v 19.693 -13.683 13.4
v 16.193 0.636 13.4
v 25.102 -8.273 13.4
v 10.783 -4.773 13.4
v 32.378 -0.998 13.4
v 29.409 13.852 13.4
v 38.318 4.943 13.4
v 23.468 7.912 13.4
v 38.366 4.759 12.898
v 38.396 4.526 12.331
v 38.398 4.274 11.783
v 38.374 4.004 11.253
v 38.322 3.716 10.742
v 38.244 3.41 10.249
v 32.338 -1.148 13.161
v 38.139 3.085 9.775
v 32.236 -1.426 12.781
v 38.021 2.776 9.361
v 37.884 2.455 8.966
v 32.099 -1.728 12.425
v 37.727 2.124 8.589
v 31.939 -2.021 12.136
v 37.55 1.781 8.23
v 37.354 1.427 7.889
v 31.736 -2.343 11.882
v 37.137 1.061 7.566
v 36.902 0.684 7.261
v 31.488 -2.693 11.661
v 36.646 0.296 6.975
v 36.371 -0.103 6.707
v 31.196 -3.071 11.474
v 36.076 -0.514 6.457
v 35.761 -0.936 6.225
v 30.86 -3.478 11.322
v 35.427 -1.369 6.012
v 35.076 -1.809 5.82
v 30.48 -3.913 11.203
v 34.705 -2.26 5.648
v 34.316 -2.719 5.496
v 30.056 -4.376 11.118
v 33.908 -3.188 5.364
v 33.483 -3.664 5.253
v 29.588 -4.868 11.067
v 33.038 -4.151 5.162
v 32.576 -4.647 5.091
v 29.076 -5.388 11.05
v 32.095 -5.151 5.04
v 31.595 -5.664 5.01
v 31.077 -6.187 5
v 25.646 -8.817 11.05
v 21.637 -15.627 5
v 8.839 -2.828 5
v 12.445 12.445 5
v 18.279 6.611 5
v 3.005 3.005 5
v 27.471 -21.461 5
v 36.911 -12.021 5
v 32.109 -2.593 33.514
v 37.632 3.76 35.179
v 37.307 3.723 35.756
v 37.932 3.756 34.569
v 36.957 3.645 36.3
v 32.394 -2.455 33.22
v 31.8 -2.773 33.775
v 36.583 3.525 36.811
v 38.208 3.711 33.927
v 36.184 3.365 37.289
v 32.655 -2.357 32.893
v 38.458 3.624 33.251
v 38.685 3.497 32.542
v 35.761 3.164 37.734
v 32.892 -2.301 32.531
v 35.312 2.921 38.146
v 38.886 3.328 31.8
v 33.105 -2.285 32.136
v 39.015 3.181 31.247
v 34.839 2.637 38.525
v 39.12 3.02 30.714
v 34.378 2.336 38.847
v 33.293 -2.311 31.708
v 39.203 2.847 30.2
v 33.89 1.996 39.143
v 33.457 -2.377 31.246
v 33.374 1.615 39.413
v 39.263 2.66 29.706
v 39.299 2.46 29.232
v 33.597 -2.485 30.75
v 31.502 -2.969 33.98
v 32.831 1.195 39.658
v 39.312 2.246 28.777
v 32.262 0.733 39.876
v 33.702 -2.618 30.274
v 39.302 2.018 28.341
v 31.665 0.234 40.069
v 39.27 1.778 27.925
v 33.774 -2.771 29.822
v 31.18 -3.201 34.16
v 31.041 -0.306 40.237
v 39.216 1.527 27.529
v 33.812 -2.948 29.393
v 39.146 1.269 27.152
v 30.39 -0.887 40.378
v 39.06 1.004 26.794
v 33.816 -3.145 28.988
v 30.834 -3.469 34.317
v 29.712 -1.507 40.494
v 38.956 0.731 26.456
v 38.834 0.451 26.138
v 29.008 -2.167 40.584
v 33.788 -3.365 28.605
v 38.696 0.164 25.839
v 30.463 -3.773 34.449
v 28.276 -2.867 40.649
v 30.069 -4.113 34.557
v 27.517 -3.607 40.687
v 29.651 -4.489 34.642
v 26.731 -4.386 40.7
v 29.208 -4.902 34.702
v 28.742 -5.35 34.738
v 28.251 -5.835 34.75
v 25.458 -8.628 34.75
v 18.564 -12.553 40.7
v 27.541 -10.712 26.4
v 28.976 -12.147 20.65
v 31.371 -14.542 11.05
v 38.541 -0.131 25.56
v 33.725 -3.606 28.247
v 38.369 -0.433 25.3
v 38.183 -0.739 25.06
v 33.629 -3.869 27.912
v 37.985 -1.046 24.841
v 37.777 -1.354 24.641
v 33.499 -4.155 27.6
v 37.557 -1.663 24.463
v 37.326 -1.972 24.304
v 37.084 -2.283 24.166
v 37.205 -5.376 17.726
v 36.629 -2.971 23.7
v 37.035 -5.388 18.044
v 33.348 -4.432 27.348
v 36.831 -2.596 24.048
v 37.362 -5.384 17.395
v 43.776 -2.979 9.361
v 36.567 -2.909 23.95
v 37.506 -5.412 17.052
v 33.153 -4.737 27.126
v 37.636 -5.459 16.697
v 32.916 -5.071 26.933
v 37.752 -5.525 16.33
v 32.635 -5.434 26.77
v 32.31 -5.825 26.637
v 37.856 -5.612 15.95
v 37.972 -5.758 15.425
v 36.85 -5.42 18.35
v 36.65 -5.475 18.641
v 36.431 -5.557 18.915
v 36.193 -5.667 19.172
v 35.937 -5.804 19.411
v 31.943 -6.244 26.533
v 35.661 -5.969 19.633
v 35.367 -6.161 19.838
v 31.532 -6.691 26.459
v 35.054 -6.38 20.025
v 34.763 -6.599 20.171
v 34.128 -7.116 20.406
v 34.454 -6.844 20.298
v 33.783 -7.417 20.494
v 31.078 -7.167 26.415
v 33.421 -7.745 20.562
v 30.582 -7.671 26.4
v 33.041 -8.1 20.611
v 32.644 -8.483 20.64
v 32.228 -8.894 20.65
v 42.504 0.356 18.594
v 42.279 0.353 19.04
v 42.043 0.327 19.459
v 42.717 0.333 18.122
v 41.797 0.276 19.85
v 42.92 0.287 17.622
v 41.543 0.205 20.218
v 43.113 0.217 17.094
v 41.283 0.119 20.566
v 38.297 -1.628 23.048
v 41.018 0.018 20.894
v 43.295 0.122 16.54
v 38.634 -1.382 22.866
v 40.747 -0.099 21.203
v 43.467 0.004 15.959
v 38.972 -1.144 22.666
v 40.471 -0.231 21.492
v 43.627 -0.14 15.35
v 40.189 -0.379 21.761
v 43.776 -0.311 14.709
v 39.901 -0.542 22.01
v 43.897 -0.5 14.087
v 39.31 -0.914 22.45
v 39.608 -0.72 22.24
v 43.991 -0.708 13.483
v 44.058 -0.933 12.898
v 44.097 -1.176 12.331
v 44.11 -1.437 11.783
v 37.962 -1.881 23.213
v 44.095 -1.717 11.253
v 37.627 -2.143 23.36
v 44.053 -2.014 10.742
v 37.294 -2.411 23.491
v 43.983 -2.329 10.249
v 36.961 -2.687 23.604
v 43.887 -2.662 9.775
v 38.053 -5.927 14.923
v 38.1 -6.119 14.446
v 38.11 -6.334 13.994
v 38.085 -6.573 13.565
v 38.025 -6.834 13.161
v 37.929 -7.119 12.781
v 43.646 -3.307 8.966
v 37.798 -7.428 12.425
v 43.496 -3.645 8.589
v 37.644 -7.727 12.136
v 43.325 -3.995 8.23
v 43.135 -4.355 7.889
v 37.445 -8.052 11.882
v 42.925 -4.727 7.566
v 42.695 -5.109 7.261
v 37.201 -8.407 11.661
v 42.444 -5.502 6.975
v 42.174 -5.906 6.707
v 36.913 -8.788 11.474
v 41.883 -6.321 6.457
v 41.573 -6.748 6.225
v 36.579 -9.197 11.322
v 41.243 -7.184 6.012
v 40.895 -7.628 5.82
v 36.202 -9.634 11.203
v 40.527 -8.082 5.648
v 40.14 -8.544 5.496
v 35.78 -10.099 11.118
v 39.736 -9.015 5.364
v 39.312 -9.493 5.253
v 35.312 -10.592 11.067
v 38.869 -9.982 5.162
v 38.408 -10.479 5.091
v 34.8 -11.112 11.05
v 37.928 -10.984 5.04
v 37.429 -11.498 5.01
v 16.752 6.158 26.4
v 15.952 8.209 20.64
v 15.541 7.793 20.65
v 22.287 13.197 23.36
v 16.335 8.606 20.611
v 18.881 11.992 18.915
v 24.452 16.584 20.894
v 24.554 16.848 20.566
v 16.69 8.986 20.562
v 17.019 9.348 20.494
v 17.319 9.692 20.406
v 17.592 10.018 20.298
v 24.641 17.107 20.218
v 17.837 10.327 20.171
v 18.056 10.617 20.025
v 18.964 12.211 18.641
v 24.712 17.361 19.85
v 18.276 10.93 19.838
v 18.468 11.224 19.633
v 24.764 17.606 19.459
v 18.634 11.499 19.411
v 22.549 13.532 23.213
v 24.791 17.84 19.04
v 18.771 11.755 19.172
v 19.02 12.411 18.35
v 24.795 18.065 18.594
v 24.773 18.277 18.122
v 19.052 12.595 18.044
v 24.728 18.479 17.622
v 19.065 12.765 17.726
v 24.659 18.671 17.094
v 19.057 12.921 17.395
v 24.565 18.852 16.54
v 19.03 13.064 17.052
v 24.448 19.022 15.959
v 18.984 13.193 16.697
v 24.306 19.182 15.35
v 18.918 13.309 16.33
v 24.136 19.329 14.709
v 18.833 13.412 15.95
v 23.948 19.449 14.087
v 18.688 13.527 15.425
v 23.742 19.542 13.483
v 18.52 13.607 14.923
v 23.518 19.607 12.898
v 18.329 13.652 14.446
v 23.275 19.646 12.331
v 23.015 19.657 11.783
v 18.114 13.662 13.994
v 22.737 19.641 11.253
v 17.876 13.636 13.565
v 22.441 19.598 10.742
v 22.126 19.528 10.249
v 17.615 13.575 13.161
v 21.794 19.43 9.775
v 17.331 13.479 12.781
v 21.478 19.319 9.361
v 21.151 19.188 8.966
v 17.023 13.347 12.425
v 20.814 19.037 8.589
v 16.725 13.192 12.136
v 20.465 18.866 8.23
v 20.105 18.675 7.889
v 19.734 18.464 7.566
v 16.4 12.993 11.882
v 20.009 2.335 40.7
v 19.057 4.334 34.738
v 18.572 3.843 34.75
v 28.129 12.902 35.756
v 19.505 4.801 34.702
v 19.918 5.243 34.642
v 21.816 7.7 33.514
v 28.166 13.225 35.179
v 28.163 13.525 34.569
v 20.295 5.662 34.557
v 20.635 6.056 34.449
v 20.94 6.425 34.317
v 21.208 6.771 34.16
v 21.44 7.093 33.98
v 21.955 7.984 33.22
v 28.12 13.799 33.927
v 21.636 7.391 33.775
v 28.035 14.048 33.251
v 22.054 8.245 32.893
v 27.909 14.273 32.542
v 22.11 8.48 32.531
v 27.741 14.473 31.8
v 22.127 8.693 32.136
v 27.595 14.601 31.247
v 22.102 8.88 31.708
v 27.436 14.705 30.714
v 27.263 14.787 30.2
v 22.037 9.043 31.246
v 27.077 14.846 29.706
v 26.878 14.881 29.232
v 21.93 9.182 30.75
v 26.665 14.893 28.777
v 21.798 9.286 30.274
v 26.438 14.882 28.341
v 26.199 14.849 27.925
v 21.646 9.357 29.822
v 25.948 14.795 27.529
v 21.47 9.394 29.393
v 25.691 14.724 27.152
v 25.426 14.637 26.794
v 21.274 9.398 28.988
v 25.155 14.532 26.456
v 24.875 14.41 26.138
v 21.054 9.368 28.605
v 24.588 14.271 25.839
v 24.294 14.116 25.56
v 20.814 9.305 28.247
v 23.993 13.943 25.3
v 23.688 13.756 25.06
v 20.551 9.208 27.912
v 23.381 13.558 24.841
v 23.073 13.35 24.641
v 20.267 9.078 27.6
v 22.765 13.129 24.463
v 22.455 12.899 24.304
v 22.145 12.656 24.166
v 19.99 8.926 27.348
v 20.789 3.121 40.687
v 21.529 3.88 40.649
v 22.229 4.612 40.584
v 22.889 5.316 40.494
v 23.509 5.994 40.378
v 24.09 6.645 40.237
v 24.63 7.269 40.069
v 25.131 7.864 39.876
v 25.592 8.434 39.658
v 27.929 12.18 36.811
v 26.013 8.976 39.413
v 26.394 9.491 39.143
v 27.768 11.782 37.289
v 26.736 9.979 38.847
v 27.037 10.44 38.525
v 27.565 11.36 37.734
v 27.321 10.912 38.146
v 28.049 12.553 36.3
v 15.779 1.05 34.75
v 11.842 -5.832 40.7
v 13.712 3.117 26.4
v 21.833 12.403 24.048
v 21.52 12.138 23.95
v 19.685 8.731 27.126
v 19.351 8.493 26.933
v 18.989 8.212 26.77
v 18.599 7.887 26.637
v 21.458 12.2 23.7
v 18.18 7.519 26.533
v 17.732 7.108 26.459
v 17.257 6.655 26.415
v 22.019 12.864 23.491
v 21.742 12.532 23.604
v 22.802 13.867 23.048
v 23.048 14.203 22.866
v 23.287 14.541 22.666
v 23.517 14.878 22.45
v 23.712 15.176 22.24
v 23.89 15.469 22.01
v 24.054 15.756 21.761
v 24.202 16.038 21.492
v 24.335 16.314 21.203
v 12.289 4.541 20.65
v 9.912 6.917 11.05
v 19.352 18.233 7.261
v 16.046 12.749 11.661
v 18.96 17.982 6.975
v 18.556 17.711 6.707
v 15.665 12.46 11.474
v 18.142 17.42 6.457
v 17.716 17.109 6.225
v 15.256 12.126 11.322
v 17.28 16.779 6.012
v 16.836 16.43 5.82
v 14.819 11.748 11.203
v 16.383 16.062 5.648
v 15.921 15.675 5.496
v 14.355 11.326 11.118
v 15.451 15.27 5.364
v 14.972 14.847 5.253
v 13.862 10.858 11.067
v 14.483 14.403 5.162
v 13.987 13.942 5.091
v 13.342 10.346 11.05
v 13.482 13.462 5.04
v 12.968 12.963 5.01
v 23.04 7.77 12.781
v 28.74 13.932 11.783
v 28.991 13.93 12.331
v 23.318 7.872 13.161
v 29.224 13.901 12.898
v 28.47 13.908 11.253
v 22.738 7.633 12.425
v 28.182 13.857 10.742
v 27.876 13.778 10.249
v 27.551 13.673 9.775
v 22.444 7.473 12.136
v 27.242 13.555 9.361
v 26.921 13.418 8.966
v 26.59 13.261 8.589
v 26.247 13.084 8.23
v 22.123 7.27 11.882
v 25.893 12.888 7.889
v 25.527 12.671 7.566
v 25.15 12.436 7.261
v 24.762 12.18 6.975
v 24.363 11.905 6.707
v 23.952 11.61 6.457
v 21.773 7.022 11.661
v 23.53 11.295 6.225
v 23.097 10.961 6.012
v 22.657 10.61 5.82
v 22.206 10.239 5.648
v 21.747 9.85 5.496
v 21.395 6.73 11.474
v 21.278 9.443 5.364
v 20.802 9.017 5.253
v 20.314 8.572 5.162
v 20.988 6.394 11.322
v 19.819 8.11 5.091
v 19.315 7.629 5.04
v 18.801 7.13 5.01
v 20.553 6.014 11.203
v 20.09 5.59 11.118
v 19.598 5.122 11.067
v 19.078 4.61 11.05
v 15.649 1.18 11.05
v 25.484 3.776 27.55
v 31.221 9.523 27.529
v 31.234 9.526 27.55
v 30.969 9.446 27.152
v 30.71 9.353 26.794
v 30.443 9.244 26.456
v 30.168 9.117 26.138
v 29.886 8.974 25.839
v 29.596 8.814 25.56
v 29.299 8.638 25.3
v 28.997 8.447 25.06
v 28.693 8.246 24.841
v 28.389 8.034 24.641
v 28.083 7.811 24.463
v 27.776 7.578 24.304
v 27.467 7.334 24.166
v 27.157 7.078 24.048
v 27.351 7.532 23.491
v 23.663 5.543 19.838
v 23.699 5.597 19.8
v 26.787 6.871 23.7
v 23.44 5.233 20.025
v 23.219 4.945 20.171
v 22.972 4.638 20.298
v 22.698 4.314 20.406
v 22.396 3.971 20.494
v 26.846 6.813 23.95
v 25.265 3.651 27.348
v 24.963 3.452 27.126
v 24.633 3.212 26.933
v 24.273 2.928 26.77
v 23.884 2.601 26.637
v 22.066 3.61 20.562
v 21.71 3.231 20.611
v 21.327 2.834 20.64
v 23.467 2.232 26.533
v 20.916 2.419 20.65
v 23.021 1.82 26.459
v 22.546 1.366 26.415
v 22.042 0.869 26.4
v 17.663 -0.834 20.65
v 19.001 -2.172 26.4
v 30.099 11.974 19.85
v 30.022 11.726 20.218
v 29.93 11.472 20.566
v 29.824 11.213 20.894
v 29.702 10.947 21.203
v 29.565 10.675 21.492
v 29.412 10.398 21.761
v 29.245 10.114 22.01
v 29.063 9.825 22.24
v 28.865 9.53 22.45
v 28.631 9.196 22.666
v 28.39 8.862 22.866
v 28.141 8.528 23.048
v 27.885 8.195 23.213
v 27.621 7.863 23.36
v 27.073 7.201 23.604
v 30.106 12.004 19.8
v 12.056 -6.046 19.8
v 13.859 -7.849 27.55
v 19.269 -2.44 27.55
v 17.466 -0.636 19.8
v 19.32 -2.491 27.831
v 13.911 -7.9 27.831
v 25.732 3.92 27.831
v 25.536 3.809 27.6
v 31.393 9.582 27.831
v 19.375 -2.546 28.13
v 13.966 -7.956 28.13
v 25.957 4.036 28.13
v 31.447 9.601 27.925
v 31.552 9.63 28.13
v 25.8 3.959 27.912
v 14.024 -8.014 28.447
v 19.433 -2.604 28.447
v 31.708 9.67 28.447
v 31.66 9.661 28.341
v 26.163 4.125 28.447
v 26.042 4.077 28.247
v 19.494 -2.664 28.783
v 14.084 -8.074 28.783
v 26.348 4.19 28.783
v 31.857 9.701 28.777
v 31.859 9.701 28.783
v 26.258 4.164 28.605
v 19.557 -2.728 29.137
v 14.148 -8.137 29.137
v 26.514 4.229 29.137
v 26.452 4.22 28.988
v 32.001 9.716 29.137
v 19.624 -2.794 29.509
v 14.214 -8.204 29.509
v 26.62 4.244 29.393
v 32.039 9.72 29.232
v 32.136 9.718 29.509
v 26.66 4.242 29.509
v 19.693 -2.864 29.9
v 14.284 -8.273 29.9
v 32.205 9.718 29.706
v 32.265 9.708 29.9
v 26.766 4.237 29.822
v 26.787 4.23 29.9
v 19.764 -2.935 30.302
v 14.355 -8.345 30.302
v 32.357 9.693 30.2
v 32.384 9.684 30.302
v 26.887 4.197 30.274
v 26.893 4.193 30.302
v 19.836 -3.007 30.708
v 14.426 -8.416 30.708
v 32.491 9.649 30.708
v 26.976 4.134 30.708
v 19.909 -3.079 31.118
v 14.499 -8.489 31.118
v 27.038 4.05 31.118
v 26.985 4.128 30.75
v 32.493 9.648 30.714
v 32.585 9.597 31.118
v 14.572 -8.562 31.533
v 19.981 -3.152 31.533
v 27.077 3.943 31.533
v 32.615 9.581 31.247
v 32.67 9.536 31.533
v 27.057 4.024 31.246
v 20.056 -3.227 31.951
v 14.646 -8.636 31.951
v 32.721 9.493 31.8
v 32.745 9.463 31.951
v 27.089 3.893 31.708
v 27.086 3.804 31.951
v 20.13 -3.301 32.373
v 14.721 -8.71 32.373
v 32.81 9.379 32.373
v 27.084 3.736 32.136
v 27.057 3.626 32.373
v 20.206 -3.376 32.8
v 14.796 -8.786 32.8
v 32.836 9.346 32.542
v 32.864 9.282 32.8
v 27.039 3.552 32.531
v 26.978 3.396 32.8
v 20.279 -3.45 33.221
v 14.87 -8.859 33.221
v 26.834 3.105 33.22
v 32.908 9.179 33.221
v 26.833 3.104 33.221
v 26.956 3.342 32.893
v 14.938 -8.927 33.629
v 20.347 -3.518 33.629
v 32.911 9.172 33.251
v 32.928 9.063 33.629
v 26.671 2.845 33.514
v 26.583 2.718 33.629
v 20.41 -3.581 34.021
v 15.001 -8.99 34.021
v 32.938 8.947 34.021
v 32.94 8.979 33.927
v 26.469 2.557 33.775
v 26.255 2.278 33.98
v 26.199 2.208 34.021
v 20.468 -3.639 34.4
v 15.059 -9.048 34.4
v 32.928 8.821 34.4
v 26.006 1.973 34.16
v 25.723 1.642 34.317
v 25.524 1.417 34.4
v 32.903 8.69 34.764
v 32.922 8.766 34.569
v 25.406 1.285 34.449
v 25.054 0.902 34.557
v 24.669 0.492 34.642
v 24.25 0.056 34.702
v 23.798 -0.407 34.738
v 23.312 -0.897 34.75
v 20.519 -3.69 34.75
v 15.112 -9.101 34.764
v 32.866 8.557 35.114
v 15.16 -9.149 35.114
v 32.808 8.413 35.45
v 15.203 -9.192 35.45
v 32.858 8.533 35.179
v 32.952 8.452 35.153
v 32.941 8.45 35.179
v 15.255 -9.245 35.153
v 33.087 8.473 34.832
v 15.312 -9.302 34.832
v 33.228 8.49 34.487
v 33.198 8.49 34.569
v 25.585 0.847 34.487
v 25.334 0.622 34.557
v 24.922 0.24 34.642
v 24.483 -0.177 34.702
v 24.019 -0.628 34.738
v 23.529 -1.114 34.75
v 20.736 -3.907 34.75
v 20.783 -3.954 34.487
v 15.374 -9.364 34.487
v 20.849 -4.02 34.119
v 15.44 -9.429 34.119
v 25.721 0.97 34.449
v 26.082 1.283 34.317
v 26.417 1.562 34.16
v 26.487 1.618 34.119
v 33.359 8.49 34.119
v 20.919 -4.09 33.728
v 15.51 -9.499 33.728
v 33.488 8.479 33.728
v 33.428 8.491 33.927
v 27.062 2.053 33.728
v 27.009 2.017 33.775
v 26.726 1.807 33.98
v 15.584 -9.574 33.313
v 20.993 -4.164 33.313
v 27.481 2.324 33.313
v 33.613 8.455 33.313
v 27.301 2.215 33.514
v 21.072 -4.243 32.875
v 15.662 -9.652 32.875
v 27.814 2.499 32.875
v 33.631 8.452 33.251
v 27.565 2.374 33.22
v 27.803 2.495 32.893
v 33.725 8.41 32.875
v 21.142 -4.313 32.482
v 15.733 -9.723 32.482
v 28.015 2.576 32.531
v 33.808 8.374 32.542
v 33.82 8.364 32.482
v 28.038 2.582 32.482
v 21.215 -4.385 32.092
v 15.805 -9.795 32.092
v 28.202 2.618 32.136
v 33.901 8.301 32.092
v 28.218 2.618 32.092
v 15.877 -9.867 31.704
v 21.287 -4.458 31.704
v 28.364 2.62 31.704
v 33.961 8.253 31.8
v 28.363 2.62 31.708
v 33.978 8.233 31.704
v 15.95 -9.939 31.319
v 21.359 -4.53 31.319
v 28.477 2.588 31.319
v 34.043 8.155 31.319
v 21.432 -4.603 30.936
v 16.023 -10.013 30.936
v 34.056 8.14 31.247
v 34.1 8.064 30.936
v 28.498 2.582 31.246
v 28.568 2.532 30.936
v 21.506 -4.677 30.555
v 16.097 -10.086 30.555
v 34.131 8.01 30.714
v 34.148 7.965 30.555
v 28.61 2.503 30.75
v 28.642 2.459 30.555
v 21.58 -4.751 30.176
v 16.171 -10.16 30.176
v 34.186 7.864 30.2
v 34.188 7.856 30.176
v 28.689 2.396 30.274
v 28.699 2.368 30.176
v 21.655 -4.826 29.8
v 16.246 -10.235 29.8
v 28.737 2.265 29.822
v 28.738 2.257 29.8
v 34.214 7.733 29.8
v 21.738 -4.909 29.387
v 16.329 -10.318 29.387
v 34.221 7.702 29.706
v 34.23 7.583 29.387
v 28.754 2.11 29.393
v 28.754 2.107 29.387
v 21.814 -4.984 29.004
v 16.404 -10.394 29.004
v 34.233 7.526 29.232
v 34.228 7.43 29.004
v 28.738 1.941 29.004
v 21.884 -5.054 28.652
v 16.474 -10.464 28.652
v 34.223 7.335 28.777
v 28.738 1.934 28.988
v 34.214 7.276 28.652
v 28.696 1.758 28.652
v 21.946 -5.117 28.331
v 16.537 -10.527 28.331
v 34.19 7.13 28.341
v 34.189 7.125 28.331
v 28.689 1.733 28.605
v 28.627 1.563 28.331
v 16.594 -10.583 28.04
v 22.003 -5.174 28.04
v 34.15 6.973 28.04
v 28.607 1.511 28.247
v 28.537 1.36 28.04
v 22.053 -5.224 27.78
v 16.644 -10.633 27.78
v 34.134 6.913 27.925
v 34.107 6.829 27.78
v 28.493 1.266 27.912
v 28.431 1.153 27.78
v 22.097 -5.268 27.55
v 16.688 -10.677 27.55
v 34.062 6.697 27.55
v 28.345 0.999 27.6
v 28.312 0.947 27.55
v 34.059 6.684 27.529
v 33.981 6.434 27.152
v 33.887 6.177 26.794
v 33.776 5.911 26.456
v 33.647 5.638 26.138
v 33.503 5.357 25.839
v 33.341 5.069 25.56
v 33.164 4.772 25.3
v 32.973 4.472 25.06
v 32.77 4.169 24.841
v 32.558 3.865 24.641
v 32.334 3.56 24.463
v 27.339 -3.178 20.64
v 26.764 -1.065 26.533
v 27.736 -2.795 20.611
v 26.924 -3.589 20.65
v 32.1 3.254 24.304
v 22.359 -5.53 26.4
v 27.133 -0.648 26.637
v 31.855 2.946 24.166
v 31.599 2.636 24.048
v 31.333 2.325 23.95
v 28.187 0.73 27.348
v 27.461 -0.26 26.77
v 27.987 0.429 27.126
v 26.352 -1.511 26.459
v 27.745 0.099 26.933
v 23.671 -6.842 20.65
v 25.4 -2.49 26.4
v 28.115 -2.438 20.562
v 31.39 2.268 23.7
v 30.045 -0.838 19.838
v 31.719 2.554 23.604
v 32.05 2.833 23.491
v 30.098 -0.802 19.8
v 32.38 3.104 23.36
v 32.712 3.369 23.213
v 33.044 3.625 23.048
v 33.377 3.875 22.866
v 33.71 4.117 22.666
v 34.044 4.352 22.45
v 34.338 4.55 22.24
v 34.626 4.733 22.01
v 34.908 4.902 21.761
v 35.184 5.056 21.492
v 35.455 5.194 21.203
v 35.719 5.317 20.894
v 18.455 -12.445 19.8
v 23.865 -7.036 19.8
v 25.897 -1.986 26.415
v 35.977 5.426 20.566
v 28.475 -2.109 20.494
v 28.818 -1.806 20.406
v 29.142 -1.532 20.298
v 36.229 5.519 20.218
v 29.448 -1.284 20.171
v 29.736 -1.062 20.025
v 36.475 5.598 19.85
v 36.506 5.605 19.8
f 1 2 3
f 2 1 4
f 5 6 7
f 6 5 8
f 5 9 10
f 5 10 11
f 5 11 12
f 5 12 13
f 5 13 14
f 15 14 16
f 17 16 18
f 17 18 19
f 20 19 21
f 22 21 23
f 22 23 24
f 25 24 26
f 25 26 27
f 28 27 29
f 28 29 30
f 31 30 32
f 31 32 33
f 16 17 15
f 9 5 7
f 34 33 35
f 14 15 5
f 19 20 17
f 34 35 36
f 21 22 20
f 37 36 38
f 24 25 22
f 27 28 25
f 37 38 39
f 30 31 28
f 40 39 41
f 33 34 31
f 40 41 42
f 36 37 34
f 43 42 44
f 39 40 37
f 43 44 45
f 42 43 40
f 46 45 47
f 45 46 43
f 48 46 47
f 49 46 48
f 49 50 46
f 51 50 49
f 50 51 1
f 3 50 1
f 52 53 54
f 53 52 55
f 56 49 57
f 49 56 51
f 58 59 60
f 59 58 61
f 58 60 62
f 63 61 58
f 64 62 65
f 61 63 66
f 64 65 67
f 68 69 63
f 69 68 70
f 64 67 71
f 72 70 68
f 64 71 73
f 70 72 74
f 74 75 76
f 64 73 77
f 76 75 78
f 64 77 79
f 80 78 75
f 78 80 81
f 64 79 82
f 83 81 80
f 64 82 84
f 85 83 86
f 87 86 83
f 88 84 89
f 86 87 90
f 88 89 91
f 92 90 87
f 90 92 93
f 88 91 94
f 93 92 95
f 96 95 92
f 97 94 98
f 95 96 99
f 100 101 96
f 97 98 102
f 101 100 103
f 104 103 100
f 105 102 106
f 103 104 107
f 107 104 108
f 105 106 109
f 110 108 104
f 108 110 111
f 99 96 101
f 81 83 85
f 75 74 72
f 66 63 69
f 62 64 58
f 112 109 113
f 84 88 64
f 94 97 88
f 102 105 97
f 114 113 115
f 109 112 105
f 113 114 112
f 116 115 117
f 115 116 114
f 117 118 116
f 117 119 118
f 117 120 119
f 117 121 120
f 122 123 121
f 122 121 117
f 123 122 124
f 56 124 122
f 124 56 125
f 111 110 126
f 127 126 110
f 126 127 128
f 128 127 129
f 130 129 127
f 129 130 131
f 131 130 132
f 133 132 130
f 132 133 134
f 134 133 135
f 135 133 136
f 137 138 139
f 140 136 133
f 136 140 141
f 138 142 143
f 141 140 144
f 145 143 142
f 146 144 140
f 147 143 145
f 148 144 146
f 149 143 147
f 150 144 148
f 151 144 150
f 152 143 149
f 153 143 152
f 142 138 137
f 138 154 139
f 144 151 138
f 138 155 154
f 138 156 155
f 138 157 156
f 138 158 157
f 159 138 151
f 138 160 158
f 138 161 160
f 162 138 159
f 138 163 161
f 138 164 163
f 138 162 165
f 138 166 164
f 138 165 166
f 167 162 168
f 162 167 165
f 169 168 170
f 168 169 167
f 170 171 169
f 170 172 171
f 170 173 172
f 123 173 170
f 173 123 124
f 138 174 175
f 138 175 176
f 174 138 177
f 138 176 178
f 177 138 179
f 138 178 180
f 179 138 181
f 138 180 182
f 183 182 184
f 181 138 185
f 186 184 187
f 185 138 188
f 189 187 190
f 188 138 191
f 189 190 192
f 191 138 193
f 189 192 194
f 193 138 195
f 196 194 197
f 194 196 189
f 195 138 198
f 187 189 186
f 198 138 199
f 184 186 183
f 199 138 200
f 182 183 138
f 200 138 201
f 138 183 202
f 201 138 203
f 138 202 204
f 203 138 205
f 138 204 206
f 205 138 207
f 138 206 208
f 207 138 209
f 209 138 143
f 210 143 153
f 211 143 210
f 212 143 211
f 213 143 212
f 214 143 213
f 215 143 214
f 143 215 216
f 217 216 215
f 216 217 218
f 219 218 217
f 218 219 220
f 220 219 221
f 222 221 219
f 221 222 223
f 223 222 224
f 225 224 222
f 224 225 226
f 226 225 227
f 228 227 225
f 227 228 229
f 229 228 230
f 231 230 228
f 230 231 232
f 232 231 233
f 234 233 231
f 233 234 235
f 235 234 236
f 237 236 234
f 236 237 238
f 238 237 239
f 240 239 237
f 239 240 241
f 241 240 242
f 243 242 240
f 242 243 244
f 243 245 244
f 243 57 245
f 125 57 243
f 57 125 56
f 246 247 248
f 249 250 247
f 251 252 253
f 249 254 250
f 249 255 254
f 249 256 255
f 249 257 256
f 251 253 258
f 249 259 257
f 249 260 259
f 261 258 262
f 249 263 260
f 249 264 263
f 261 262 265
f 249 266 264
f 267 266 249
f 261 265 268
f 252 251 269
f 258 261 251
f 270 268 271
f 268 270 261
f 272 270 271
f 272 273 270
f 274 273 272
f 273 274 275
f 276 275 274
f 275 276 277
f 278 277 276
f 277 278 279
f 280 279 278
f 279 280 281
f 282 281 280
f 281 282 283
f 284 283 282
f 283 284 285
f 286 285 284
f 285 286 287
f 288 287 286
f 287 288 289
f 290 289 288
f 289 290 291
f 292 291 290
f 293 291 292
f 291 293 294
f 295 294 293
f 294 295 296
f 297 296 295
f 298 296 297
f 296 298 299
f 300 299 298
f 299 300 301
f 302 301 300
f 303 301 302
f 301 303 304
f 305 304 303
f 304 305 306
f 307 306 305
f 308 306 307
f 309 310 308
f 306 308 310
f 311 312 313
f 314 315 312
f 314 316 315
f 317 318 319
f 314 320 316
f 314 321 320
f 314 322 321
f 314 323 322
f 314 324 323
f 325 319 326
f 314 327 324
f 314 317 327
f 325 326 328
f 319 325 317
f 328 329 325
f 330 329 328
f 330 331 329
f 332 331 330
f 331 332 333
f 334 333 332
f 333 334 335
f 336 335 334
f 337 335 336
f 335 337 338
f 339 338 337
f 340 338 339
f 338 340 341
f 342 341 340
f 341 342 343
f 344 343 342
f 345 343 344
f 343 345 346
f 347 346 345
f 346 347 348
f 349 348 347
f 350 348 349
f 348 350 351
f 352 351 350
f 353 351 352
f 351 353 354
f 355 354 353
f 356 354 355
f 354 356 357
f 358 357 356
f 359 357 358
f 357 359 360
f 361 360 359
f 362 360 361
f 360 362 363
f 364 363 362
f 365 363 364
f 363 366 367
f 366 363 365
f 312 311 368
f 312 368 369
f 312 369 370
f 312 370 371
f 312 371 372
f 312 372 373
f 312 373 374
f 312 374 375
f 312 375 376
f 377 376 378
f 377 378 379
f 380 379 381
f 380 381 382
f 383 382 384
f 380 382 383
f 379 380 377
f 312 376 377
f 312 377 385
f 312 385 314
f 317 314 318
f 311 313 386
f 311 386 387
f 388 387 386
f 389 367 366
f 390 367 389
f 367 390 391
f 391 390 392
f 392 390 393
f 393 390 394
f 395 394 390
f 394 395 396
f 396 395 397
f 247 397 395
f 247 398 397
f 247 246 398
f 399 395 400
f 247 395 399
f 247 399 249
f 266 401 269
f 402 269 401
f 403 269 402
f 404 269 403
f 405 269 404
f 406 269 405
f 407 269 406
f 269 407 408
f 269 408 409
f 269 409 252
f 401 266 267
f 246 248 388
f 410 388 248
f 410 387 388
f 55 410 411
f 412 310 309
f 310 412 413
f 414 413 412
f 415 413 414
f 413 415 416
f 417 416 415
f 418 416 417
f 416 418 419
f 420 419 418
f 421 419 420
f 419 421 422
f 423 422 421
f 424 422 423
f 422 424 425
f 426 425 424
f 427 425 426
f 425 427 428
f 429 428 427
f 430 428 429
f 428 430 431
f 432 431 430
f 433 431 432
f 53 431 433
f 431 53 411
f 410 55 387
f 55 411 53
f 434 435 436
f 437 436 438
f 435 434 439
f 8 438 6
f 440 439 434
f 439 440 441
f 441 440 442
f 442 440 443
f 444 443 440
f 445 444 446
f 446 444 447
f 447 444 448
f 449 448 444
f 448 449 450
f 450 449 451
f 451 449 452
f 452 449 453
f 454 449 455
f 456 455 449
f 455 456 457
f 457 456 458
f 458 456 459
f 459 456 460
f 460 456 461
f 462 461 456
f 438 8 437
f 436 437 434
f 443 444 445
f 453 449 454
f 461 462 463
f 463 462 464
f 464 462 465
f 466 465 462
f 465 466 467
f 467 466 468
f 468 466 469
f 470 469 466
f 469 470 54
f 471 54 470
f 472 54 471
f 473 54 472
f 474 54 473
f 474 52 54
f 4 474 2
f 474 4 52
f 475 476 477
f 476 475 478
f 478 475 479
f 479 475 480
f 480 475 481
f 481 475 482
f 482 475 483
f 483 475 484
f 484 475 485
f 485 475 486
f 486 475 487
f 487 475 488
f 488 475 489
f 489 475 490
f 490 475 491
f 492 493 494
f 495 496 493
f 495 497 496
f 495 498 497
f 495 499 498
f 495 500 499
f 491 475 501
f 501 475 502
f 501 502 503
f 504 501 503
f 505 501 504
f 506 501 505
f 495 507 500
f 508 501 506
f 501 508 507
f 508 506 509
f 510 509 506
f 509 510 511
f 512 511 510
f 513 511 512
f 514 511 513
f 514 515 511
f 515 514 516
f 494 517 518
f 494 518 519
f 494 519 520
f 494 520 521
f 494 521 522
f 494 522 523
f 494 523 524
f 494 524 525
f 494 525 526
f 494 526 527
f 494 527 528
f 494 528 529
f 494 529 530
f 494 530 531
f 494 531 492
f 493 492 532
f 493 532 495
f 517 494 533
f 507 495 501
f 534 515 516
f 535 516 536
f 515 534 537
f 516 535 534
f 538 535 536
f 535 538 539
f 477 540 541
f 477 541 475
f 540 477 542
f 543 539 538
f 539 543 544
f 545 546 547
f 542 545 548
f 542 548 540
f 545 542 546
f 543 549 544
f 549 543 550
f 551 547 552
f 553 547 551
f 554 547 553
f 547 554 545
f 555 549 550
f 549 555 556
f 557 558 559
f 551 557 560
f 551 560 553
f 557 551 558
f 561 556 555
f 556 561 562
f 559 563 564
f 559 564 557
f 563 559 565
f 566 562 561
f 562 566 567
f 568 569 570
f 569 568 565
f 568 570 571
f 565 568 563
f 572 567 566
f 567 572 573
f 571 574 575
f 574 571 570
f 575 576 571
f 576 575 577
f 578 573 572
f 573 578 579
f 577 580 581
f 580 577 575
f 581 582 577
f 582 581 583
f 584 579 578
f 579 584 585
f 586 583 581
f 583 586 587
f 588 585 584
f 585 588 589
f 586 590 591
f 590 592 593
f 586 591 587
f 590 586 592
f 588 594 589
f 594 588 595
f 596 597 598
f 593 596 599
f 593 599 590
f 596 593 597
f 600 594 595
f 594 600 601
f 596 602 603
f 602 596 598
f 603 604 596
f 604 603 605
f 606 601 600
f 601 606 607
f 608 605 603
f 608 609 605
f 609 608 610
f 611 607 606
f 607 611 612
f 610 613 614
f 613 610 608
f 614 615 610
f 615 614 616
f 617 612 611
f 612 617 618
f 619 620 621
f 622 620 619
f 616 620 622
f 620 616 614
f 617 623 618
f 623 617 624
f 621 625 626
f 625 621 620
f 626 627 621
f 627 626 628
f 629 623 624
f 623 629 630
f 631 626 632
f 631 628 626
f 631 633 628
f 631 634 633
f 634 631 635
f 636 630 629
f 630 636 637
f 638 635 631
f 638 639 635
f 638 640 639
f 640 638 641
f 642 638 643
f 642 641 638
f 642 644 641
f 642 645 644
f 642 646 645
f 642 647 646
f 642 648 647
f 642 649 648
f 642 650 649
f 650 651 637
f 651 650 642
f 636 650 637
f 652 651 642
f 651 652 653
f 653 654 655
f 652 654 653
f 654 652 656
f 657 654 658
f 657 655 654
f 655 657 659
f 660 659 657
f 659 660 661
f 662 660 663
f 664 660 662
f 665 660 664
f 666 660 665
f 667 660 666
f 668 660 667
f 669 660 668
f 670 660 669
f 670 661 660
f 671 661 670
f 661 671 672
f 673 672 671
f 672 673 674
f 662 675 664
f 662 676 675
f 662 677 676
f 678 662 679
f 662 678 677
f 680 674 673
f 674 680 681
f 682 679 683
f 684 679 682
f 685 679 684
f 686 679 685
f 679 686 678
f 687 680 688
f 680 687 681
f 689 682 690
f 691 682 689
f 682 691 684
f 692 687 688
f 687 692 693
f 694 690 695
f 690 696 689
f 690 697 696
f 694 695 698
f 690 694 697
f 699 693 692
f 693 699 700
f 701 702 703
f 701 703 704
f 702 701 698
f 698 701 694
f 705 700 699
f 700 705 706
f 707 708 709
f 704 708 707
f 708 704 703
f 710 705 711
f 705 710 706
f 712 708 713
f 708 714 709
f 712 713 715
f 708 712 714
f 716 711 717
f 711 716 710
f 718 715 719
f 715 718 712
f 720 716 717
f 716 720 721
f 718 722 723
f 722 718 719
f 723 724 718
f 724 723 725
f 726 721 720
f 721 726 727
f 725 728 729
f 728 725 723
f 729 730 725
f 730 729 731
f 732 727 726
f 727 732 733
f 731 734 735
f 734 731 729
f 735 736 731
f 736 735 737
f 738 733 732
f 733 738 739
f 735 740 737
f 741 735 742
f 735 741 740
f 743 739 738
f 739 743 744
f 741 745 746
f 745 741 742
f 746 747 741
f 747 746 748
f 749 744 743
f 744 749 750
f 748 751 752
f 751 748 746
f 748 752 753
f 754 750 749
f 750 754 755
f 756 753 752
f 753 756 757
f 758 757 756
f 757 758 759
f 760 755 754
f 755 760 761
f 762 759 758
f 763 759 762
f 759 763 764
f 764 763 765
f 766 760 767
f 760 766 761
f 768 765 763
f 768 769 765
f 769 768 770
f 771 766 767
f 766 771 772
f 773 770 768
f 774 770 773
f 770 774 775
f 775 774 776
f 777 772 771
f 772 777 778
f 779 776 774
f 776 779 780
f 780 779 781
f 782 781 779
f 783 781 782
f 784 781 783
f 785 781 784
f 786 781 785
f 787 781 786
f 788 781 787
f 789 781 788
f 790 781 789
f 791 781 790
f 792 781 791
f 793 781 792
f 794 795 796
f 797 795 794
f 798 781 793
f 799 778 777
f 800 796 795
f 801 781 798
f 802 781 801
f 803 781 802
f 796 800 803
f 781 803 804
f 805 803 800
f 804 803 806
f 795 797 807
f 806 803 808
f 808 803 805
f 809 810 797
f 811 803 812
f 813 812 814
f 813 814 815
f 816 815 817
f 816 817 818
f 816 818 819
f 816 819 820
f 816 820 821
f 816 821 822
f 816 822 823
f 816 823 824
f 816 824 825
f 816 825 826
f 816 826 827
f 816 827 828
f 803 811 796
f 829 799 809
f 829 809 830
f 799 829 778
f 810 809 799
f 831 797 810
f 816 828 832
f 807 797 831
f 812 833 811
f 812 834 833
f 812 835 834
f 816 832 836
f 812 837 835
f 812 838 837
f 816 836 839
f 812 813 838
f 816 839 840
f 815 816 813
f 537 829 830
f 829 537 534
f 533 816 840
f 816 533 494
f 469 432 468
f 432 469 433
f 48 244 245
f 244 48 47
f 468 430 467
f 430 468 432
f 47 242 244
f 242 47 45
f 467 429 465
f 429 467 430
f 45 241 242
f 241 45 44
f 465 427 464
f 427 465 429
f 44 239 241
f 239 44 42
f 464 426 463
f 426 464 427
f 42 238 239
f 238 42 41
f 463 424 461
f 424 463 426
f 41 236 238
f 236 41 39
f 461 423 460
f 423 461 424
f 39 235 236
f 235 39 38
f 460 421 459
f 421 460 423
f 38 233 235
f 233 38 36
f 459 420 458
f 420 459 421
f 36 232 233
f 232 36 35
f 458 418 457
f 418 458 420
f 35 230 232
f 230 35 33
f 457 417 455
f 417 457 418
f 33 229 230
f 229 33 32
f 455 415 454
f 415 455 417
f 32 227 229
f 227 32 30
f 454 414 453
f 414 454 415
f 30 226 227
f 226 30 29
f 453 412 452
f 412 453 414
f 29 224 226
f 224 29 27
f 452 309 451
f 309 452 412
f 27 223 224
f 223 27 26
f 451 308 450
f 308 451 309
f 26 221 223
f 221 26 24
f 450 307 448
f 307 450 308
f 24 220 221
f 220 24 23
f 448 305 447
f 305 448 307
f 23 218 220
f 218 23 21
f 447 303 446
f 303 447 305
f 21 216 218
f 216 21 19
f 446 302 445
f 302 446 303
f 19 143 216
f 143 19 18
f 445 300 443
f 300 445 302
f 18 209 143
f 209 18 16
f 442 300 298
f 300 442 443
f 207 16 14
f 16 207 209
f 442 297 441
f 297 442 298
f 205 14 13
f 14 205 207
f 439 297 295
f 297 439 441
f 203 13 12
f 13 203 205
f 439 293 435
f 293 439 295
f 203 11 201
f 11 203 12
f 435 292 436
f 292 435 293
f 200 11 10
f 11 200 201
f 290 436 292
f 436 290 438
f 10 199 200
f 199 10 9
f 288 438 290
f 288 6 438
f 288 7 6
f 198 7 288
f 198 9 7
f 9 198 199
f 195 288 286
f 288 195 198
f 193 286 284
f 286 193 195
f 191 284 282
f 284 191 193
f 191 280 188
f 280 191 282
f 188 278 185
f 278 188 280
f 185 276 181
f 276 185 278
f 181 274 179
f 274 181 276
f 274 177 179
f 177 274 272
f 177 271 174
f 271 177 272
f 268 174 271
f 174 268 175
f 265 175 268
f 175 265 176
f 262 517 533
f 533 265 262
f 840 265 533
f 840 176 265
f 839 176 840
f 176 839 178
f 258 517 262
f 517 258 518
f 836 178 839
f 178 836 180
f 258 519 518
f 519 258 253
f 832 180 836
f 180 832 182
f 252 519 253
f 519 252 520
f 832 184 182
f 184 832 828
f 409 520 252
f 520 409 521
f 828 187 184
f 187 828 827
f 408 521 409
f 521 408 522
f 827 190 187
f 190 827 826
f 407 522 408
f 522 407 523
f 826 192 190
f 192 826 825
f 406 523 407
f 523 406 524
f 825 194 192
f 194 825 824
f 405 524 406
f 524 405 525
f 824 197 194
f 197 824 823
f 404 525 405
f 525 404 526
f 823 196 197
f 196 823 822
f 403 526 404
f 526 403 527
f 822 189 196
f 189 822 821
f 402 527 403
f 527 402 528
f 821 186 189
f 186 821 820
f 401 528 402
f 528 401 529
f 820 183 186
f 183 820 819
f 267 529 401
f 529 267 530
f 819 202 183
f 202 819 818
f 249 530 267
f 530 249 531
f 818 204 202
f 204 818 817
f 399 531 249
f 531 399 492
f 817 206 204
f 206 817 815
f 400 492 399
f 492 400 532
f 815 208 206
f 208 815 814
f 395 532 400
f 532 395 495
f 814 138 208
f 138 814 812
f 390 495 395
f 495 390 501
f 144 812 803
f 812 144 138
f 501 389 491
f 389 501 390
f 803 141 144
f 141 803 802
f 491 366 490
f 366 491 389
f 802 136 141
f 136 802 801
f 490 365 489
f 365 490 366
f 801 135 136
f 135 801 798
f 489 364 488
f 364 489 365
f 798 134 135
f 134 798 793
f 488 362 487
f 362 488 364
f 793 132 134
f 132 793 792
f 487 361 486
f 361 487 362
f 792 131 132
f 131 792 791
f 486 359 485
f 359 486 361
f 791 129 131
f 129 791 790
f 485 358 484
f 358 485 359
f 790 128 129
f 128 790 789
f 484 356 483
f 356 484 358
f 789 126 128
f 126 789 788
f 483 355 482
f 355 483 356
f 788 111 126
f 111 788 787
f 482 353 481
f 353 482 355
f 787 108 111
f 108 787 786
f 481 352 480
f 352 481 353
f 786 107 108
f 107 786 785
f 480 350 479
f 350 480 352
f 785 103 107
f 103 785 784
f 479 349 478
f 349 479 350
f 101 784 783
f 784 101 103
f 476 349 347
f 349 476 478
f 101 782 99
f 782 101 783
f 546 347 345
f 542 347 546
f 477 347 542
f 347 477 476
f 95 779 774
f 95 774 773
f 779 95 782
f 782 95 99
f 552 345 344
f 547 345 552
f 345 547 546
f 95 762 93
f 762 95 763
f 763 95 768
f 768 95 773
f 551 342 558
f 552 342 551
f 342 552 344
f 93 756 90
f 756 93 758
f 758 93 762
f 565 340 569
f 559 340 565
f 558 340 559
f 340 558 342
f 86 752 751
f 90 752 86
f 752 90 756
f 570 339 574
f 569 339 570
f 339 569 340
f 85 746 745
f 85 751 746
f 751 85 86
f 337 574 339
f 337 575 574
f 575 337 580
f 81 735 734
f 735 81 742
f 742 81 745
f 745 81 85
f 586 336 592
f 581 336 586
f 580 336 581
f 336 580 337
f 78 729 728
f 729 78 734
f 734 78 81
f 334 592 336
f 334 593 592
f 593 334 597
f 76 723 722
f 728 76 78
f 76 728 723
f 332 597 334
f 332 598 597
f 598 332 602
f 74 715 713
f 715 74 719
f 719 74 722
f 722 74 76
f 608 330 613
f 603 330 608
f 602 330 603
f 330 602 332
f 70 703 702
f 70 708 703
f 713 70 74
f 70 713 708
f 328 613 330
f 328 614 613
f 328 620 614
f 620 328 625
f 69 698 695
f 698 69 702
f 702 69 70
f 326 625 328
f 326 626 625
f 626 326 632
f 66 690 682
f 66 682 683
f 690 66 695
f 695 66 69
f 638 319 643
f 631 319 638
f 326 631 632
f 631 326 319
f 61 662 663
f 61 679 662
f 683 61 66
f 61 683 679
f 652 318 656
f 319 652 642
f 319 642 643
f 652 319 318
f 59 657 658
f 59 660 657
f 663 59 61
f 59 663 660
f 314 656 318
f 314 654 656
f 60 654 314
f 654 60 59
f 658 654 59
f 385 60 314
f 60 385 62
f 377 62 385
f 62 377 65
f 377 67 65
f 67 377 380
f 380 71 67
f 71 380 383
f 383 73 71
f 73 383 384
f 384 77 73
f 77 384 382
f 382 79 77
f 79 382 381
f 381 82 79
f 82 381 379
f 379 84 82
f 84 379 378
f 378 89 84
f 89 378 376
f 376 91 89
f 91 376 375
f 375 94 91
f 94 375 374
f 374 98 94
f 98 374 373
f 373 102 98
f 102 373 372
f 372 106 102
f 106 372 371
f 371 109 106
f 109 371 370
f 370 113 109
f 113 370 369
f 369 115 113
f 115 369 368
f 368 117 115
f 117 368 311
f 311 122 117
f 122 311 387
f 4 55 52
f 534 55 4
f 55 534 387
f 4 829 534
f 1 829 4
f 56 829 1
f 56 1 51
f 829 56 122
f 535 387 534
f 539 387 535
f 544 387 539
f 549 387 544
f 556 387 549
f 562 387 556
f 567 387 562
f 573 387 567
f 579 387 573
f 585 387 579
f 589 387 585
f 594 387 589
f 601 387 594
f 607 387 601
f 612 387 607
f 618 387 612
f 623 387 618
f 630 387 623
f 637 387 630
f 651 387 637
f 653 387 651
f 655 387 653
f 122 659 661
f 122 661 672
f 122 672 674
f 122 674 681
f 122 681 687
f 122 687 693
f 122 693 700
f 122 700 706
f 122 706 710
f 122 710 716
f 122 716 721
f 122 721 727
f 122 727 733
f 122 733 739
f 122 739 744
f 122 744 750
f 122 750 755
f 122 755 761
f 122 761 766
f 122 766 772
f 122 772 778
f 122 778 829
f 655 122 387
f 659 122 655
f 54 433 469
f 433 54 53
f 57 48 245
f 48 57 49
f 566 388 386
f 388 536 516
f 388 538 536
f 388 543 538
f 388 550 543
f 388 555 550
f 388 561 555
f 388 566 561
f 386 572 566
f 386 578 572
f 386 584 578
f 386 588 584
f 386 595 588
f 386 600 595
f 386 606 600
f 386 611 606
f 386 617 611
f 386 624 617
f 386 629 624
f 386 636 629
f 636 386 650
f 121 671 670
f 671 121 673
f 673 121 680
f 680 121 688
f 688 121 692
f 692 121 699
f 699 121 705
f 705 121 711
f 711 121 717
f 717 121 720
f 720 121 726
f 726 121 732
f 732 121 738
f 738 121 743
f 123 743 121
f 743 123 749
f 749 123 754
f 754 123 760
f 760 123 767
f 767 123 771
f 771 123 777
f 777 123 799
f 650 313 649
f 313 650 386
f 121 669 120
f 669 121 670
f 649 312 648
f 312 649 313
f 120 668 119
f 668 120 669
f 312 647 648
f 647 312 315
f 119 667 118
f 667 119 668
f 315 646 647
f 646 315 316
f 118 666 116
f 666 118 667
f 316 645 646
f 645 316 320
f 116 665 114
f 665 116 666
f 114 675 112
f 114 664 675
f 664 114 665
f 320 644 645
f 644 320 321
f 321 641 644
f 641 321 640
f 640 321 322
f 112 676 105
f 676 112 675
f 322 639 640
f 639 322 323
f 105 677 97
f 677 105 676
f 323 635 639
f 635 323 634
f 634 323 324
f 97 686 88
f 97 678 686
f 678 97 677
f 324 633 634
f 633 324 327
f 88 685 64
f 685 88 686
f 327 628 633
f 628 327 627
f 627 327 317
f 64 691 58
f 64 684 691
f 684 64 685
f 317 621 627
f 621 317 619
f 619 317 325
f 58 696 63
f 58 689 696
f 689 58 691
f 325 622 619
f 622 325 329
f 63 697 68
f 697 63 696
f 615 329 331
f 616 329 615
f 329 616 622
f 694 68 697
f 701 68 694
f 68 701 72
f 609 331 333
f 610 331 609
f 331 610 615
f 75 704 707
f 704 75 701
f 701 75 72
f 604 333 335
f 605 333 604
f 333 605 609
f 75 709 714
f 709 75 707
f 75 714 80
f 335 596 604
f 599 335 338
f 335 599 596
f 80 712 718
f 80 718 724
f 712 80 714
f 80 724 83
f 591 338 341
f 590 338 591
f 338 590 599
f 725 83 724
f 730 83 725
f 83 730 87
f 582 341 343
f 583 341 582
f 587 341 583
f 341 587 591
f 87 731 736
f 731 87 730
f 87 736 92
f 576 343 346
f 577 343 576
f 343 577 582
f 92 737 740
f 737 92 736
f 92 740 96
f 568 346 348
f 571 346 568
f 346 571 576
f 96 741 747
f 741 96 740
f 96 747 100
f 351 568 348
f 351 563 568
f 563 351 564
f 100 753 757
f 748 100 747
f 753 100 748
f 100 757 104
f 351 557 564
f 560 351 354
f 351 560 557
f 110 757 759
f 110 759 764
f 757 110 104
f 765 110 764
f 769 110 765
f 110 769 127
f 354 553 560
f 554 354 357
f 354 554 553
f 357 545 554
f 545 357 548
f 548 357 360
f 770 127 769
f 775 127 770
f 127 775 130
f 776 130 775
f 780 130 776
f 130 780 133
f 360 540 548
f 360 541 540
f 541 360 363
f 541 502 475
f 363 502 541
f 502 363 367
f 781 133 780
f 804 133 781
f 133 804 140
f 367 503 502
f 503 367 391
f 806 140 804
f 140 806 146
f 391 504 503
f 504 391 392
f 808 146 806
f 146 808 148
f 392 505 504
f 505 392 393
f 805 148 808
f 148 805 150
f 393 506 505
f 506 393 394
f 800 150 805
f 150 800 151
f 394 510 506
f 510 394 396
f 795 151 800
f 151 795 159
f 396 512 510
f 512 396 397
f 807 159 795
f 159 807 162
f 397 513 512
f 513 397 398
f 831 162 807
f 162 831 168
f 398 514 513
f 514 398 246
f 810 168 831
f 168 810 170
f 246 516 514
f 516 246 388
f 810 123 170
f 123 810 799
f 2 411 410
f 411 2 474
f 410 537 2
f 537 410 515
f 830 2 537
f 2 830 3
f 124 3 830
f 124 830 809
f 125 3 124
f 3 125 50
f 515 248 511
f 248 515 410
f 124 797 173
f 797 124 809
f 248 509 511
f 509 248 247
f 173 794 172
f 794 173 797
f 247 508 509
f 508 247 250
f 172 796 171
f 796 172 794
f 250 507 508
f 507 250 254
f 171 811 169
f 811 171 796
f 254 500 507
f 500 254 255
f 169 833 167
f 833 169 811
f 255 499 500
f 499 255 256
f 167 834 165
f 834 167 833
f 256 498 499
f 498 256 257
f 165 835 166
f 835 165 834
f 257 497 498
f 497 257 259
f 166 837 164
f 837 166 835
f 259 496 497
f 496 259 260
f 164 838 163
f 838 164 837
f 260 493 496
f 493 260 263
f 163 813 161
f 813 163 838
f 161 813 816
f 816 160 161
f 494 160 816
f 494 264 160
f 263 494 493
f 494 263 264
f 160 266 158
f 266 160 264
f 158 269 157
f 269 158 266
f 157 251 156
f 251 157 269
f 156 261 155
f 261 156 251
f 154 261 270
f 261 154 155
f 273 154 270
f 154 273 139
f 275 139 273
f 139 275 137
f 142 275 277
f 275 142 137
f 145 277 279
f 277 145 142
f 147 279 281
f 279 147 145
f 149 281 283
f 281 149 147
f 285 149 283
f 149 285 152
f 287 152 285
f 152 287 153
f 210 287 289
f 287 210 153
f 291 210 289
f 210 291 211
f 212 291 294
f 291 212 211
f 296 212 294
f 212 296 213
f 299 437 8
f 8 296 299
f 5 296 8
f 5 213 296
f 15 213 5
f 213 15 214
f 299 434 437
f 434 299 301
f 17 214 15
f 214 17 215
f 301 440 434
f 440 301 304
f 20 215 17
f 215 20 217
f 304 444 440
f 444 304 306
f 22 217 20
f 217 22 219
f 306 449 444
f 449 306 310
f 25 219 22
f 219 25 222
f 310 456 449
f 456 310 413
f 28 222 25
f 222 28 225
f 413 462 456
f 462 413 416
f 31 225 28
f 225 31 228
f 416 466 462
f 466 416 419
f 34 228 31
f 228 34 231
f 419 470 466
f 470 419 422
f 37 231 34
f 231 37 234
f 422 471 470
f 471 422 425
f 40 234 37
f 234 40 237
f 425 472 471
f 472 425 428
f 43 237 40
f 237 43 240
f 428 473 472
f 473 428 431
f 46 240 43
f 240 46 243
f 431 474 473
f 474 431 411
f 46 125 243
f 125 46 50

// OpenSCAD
$fn=30;
text_height=50;
letterSpace=65;
extrudeLength=250;

module c_65(){polygon(points=[[21.850,14.800],[19.350,22.550],[19.288,22.780],[19.217,23.040],[19.137,23.331],[19.048,23.652],[18.949,24.004],[18.842,24.387],[18.725,24.800],[18.619,25.176],[18.514,25.555],[18.410,25.936],[18.306,26.319],[18.204,26.704],[18.102,27.092],[18.000,27.482],[17.900,27.875],[17.789,28.313],[17.684,28.728],[17.585,29.119],[17.492,29.487],[17.405,29.832],[17.324,30.153],[17.250,30.450],[17.250,30.450],[17.189,30.114],[17.121,29.764],[17.046,29.400],[16.964,29.021],[16.875,28.629],[16.779,28.221],[16.675,27.800],[16.568,27.373],[16.463,26.951],[16.358,26.533],[16.255,26.118],[16.152,25.708],[16.051,25.302],[15.950,24.900],[15.852,24.509],[15.758,24.137],[15.668,23.783],[15.583,23.447],[15.501,23.130],[15.423,22.831],[15.350,22.550],[15.350,22.550],[12.800,14.800],[21.850,14.800],[34.600,0.000],[26.350,0.000],[23.600,8.400],[11.000,8.400],[8.250,0.000],[0.000,0.000],[12.550,35.850],[21.950,35.850],[34.600,0.000]],paths=[[0,1,2,3,4,5,6,7,8,9,10,11,12,13,14,15,16,17,18,19,20,21,22,23,24,25,26,27,28,29,30,31,32,33,34,35,36,37,38,39,40,41,42,43,44,45,46,47,48],[57,56,55,54,53,52,51,50,49]]);}
module c_66(){polygon(points=[[11.900,21.400],[16.200,21.400],[16.908,21.415],[17.565,21.459],[18.172,21.533],[18.728,21.637],[19.234,21.770],[19.689,21.933],[20.093,22.126],[20.447,22.348],[20.750,22.600],[21.043,22.912],[21.297,23.247],[21.512,23.605],[21.688,23.988],[21.824,24.393],[21.922,24.822],[21.980,25.274],[22.000,25.750],[22.000,25.750],[21.977,26.246],[21.908,26.708],[21.793,27.136],[21.631,27.531],[21.424,27.893],[21.170,28.220],[20.871,28.514],[20.525,28.775],[20.176,28.980],[19.784,29.160],[19.350,29.317],[18.873,29.449],[18.354,29.557],[17.792,29.642],[17.187,29.702],[16.540,29.738],[15.850,29.750],[15.850,29.750],[11.900,29.750],[11.900,21.400],[16.500,15.650],[11.900,15.650],[11.900,6.050],[16.750,6.050],[17.480,6.067],[18.159,6.118],[18.786,6.203],[19.362,6.322],[19.887,6.474],[20.361,6.661],[20.784,6.882],[21.155,7.136],[21.475,7.425],[21.786,7.781],[22.055,8.161],[22.282,8.565],[22.469,8.994],[22.614,9.446],[22.717,9.923],[22.779,10.425],[22.800,10.950],[22.800,10.950],[22.788,11.330],[22.753,11.697],[22.694,12.052],[22.612,12.395],[22.507,12.726],[22.378,13.044],[22.225,13.350],[22.044,13.641],[21.831,13.915],[21.585,14.172],[21.307,14.411],[20.995,14.633],[20.652,14.838],[20.275,15.025],[19.915,15.171],[19.523,15.298],[19.100,15.406],[18.644,15.494],[18.156,15.562],[17.636,15.611],[17.084,15.640],[16.500,15.650],[16.500,15.650],[4.250,35.700],[15.800,35.700],[16.907,35.687],[17.967,35.649],[18.979,35.584],[19.944,35.494],[20.862,35.378],[21.733,35.237],[22.556,35.069],[23.331,34.876],[24.060,34.658],[24.741,34.413],[25.375,34.143],[25.961,33.847],[26.500,33.525],[27.035,33.146],[27.524,32.734],[27.966,32.289],[28.361,31.811],[28.710,31.300],[29.013,30.756],[29.268,30.179],[29.478,29.569],[29.641,28.927],[29.757,28.251],[29.827,27.542],[29.850,26.800],[29.850,26.800],[29.837,26.247],[29.798,25.714],[29.734,25.200],[29.644,24.706],[29.528,24.232],[29.386,23.777],[29.218,23.341],[29.025,22.925],[28.810,22.529],[28.578,22.152],[28.329,21.794],[28.063,21.456],[27.779,21.138],[27.478,20.839],[27.160,20.560],[26.825,20.300],[26.477,20.060],[26.120,19.841],[25.755,19.641],[25.381,19.463],[24.999,19.304],[24.608,19.166],[24.208,19.048],[23.800,18.950],[23.800,18.950],[23.800,18.700],[24.235,18.604],[24.666,18.491],[25.091,18.360],[25.513,18.213],[25.929,18.048],[26.341,17.866],[26.748,17.666],[27.150,17.450],[27.498,17.240],[27.831,17.010],[28.150,16.761],[28.454,16.492],[28.743,16.203],[29.017,15.894],[29.276,15.566],[29.520,15.218],[29.750,14.850],[29.960,14.459],[30.145,14.040],[30.306,13.594],[30.441,13.122],[30.552,12.622],[30.639,12.094],[30.701,11.540],[30.738,10.959],[30.750,10.350],[30.750,10.350],[30.734,9.709],[30.686,9.087],[30.606,8.483],[30.494,7.898],[30.350,7.331],[30.174,6.783],[29.966,6.253],[29.726,5.742],[29.454,5.249],[29.150,4.775],[28.848,4.361],[28.524,3.966],[28.179,3.589],[27.811,3.230],[27.422,2.889],[27.010,2.566],[26.577,2.261],[26.122,1.975],[25.645,1.707],[25.146,1.457],[24.625,1.225],[24.083,1.012],[23.523,0.820],[22.942,0.648],[22.342,0.496],[21.723,0.364],[21.085,0.253],[20.426,0.162],[19.749,0.091],[19.052,0.040],[18.336,0.010],[17.600,0.000],[17.600,0.000],[4.250,0.000],[4.250,35.700]],paths=[[0,1,2,3,4,5,6,7,8,9,10,11,12,13,14,15,16,17,18,19,20,21,22,23,24,25,26,27,28,29,30,31,32,33,34,35,36,37,38,39],[40,41,42,43,44,45,46,47,48,49,50,51,52,53,54,55,56,57,58,59,60,61,62,63,64,65,66,67,68,69,70,71,72,73,74,75,76,77,78,79,80,81,82,83,84],[200,199,198,197,196,195,194,193,192,191,190,189,188,187,186,185,184,183,182,181,180,179,178,177,176,175,174,173,172,171,170,169,168,167,166,165,164,163,162,161,160,159,158,157,156,155,154,153,152,151,150,149,148,147,146,145,144,143,142,141,140,139,138,137,136,135,134,133,132,131,130,129,128,127,126,125,124,123,122,121,120,119,118,117,116,115,114,113,112,111,110,109,108,107,106,105,104,103,102,101,100,99,98,97,96,95,94,93,92,91,90,89,88,87,86,85]]);}

render() union() {
  translate([0,0,5]){
    intersection(){
      rotate([90,0,-45]) translate([0,0,-125]) linear_extrude(250) c_65();
      rotate([90,0,45]) translate([0,0,-125]) linear_extrude(250) c_66();
    }
  }
}
